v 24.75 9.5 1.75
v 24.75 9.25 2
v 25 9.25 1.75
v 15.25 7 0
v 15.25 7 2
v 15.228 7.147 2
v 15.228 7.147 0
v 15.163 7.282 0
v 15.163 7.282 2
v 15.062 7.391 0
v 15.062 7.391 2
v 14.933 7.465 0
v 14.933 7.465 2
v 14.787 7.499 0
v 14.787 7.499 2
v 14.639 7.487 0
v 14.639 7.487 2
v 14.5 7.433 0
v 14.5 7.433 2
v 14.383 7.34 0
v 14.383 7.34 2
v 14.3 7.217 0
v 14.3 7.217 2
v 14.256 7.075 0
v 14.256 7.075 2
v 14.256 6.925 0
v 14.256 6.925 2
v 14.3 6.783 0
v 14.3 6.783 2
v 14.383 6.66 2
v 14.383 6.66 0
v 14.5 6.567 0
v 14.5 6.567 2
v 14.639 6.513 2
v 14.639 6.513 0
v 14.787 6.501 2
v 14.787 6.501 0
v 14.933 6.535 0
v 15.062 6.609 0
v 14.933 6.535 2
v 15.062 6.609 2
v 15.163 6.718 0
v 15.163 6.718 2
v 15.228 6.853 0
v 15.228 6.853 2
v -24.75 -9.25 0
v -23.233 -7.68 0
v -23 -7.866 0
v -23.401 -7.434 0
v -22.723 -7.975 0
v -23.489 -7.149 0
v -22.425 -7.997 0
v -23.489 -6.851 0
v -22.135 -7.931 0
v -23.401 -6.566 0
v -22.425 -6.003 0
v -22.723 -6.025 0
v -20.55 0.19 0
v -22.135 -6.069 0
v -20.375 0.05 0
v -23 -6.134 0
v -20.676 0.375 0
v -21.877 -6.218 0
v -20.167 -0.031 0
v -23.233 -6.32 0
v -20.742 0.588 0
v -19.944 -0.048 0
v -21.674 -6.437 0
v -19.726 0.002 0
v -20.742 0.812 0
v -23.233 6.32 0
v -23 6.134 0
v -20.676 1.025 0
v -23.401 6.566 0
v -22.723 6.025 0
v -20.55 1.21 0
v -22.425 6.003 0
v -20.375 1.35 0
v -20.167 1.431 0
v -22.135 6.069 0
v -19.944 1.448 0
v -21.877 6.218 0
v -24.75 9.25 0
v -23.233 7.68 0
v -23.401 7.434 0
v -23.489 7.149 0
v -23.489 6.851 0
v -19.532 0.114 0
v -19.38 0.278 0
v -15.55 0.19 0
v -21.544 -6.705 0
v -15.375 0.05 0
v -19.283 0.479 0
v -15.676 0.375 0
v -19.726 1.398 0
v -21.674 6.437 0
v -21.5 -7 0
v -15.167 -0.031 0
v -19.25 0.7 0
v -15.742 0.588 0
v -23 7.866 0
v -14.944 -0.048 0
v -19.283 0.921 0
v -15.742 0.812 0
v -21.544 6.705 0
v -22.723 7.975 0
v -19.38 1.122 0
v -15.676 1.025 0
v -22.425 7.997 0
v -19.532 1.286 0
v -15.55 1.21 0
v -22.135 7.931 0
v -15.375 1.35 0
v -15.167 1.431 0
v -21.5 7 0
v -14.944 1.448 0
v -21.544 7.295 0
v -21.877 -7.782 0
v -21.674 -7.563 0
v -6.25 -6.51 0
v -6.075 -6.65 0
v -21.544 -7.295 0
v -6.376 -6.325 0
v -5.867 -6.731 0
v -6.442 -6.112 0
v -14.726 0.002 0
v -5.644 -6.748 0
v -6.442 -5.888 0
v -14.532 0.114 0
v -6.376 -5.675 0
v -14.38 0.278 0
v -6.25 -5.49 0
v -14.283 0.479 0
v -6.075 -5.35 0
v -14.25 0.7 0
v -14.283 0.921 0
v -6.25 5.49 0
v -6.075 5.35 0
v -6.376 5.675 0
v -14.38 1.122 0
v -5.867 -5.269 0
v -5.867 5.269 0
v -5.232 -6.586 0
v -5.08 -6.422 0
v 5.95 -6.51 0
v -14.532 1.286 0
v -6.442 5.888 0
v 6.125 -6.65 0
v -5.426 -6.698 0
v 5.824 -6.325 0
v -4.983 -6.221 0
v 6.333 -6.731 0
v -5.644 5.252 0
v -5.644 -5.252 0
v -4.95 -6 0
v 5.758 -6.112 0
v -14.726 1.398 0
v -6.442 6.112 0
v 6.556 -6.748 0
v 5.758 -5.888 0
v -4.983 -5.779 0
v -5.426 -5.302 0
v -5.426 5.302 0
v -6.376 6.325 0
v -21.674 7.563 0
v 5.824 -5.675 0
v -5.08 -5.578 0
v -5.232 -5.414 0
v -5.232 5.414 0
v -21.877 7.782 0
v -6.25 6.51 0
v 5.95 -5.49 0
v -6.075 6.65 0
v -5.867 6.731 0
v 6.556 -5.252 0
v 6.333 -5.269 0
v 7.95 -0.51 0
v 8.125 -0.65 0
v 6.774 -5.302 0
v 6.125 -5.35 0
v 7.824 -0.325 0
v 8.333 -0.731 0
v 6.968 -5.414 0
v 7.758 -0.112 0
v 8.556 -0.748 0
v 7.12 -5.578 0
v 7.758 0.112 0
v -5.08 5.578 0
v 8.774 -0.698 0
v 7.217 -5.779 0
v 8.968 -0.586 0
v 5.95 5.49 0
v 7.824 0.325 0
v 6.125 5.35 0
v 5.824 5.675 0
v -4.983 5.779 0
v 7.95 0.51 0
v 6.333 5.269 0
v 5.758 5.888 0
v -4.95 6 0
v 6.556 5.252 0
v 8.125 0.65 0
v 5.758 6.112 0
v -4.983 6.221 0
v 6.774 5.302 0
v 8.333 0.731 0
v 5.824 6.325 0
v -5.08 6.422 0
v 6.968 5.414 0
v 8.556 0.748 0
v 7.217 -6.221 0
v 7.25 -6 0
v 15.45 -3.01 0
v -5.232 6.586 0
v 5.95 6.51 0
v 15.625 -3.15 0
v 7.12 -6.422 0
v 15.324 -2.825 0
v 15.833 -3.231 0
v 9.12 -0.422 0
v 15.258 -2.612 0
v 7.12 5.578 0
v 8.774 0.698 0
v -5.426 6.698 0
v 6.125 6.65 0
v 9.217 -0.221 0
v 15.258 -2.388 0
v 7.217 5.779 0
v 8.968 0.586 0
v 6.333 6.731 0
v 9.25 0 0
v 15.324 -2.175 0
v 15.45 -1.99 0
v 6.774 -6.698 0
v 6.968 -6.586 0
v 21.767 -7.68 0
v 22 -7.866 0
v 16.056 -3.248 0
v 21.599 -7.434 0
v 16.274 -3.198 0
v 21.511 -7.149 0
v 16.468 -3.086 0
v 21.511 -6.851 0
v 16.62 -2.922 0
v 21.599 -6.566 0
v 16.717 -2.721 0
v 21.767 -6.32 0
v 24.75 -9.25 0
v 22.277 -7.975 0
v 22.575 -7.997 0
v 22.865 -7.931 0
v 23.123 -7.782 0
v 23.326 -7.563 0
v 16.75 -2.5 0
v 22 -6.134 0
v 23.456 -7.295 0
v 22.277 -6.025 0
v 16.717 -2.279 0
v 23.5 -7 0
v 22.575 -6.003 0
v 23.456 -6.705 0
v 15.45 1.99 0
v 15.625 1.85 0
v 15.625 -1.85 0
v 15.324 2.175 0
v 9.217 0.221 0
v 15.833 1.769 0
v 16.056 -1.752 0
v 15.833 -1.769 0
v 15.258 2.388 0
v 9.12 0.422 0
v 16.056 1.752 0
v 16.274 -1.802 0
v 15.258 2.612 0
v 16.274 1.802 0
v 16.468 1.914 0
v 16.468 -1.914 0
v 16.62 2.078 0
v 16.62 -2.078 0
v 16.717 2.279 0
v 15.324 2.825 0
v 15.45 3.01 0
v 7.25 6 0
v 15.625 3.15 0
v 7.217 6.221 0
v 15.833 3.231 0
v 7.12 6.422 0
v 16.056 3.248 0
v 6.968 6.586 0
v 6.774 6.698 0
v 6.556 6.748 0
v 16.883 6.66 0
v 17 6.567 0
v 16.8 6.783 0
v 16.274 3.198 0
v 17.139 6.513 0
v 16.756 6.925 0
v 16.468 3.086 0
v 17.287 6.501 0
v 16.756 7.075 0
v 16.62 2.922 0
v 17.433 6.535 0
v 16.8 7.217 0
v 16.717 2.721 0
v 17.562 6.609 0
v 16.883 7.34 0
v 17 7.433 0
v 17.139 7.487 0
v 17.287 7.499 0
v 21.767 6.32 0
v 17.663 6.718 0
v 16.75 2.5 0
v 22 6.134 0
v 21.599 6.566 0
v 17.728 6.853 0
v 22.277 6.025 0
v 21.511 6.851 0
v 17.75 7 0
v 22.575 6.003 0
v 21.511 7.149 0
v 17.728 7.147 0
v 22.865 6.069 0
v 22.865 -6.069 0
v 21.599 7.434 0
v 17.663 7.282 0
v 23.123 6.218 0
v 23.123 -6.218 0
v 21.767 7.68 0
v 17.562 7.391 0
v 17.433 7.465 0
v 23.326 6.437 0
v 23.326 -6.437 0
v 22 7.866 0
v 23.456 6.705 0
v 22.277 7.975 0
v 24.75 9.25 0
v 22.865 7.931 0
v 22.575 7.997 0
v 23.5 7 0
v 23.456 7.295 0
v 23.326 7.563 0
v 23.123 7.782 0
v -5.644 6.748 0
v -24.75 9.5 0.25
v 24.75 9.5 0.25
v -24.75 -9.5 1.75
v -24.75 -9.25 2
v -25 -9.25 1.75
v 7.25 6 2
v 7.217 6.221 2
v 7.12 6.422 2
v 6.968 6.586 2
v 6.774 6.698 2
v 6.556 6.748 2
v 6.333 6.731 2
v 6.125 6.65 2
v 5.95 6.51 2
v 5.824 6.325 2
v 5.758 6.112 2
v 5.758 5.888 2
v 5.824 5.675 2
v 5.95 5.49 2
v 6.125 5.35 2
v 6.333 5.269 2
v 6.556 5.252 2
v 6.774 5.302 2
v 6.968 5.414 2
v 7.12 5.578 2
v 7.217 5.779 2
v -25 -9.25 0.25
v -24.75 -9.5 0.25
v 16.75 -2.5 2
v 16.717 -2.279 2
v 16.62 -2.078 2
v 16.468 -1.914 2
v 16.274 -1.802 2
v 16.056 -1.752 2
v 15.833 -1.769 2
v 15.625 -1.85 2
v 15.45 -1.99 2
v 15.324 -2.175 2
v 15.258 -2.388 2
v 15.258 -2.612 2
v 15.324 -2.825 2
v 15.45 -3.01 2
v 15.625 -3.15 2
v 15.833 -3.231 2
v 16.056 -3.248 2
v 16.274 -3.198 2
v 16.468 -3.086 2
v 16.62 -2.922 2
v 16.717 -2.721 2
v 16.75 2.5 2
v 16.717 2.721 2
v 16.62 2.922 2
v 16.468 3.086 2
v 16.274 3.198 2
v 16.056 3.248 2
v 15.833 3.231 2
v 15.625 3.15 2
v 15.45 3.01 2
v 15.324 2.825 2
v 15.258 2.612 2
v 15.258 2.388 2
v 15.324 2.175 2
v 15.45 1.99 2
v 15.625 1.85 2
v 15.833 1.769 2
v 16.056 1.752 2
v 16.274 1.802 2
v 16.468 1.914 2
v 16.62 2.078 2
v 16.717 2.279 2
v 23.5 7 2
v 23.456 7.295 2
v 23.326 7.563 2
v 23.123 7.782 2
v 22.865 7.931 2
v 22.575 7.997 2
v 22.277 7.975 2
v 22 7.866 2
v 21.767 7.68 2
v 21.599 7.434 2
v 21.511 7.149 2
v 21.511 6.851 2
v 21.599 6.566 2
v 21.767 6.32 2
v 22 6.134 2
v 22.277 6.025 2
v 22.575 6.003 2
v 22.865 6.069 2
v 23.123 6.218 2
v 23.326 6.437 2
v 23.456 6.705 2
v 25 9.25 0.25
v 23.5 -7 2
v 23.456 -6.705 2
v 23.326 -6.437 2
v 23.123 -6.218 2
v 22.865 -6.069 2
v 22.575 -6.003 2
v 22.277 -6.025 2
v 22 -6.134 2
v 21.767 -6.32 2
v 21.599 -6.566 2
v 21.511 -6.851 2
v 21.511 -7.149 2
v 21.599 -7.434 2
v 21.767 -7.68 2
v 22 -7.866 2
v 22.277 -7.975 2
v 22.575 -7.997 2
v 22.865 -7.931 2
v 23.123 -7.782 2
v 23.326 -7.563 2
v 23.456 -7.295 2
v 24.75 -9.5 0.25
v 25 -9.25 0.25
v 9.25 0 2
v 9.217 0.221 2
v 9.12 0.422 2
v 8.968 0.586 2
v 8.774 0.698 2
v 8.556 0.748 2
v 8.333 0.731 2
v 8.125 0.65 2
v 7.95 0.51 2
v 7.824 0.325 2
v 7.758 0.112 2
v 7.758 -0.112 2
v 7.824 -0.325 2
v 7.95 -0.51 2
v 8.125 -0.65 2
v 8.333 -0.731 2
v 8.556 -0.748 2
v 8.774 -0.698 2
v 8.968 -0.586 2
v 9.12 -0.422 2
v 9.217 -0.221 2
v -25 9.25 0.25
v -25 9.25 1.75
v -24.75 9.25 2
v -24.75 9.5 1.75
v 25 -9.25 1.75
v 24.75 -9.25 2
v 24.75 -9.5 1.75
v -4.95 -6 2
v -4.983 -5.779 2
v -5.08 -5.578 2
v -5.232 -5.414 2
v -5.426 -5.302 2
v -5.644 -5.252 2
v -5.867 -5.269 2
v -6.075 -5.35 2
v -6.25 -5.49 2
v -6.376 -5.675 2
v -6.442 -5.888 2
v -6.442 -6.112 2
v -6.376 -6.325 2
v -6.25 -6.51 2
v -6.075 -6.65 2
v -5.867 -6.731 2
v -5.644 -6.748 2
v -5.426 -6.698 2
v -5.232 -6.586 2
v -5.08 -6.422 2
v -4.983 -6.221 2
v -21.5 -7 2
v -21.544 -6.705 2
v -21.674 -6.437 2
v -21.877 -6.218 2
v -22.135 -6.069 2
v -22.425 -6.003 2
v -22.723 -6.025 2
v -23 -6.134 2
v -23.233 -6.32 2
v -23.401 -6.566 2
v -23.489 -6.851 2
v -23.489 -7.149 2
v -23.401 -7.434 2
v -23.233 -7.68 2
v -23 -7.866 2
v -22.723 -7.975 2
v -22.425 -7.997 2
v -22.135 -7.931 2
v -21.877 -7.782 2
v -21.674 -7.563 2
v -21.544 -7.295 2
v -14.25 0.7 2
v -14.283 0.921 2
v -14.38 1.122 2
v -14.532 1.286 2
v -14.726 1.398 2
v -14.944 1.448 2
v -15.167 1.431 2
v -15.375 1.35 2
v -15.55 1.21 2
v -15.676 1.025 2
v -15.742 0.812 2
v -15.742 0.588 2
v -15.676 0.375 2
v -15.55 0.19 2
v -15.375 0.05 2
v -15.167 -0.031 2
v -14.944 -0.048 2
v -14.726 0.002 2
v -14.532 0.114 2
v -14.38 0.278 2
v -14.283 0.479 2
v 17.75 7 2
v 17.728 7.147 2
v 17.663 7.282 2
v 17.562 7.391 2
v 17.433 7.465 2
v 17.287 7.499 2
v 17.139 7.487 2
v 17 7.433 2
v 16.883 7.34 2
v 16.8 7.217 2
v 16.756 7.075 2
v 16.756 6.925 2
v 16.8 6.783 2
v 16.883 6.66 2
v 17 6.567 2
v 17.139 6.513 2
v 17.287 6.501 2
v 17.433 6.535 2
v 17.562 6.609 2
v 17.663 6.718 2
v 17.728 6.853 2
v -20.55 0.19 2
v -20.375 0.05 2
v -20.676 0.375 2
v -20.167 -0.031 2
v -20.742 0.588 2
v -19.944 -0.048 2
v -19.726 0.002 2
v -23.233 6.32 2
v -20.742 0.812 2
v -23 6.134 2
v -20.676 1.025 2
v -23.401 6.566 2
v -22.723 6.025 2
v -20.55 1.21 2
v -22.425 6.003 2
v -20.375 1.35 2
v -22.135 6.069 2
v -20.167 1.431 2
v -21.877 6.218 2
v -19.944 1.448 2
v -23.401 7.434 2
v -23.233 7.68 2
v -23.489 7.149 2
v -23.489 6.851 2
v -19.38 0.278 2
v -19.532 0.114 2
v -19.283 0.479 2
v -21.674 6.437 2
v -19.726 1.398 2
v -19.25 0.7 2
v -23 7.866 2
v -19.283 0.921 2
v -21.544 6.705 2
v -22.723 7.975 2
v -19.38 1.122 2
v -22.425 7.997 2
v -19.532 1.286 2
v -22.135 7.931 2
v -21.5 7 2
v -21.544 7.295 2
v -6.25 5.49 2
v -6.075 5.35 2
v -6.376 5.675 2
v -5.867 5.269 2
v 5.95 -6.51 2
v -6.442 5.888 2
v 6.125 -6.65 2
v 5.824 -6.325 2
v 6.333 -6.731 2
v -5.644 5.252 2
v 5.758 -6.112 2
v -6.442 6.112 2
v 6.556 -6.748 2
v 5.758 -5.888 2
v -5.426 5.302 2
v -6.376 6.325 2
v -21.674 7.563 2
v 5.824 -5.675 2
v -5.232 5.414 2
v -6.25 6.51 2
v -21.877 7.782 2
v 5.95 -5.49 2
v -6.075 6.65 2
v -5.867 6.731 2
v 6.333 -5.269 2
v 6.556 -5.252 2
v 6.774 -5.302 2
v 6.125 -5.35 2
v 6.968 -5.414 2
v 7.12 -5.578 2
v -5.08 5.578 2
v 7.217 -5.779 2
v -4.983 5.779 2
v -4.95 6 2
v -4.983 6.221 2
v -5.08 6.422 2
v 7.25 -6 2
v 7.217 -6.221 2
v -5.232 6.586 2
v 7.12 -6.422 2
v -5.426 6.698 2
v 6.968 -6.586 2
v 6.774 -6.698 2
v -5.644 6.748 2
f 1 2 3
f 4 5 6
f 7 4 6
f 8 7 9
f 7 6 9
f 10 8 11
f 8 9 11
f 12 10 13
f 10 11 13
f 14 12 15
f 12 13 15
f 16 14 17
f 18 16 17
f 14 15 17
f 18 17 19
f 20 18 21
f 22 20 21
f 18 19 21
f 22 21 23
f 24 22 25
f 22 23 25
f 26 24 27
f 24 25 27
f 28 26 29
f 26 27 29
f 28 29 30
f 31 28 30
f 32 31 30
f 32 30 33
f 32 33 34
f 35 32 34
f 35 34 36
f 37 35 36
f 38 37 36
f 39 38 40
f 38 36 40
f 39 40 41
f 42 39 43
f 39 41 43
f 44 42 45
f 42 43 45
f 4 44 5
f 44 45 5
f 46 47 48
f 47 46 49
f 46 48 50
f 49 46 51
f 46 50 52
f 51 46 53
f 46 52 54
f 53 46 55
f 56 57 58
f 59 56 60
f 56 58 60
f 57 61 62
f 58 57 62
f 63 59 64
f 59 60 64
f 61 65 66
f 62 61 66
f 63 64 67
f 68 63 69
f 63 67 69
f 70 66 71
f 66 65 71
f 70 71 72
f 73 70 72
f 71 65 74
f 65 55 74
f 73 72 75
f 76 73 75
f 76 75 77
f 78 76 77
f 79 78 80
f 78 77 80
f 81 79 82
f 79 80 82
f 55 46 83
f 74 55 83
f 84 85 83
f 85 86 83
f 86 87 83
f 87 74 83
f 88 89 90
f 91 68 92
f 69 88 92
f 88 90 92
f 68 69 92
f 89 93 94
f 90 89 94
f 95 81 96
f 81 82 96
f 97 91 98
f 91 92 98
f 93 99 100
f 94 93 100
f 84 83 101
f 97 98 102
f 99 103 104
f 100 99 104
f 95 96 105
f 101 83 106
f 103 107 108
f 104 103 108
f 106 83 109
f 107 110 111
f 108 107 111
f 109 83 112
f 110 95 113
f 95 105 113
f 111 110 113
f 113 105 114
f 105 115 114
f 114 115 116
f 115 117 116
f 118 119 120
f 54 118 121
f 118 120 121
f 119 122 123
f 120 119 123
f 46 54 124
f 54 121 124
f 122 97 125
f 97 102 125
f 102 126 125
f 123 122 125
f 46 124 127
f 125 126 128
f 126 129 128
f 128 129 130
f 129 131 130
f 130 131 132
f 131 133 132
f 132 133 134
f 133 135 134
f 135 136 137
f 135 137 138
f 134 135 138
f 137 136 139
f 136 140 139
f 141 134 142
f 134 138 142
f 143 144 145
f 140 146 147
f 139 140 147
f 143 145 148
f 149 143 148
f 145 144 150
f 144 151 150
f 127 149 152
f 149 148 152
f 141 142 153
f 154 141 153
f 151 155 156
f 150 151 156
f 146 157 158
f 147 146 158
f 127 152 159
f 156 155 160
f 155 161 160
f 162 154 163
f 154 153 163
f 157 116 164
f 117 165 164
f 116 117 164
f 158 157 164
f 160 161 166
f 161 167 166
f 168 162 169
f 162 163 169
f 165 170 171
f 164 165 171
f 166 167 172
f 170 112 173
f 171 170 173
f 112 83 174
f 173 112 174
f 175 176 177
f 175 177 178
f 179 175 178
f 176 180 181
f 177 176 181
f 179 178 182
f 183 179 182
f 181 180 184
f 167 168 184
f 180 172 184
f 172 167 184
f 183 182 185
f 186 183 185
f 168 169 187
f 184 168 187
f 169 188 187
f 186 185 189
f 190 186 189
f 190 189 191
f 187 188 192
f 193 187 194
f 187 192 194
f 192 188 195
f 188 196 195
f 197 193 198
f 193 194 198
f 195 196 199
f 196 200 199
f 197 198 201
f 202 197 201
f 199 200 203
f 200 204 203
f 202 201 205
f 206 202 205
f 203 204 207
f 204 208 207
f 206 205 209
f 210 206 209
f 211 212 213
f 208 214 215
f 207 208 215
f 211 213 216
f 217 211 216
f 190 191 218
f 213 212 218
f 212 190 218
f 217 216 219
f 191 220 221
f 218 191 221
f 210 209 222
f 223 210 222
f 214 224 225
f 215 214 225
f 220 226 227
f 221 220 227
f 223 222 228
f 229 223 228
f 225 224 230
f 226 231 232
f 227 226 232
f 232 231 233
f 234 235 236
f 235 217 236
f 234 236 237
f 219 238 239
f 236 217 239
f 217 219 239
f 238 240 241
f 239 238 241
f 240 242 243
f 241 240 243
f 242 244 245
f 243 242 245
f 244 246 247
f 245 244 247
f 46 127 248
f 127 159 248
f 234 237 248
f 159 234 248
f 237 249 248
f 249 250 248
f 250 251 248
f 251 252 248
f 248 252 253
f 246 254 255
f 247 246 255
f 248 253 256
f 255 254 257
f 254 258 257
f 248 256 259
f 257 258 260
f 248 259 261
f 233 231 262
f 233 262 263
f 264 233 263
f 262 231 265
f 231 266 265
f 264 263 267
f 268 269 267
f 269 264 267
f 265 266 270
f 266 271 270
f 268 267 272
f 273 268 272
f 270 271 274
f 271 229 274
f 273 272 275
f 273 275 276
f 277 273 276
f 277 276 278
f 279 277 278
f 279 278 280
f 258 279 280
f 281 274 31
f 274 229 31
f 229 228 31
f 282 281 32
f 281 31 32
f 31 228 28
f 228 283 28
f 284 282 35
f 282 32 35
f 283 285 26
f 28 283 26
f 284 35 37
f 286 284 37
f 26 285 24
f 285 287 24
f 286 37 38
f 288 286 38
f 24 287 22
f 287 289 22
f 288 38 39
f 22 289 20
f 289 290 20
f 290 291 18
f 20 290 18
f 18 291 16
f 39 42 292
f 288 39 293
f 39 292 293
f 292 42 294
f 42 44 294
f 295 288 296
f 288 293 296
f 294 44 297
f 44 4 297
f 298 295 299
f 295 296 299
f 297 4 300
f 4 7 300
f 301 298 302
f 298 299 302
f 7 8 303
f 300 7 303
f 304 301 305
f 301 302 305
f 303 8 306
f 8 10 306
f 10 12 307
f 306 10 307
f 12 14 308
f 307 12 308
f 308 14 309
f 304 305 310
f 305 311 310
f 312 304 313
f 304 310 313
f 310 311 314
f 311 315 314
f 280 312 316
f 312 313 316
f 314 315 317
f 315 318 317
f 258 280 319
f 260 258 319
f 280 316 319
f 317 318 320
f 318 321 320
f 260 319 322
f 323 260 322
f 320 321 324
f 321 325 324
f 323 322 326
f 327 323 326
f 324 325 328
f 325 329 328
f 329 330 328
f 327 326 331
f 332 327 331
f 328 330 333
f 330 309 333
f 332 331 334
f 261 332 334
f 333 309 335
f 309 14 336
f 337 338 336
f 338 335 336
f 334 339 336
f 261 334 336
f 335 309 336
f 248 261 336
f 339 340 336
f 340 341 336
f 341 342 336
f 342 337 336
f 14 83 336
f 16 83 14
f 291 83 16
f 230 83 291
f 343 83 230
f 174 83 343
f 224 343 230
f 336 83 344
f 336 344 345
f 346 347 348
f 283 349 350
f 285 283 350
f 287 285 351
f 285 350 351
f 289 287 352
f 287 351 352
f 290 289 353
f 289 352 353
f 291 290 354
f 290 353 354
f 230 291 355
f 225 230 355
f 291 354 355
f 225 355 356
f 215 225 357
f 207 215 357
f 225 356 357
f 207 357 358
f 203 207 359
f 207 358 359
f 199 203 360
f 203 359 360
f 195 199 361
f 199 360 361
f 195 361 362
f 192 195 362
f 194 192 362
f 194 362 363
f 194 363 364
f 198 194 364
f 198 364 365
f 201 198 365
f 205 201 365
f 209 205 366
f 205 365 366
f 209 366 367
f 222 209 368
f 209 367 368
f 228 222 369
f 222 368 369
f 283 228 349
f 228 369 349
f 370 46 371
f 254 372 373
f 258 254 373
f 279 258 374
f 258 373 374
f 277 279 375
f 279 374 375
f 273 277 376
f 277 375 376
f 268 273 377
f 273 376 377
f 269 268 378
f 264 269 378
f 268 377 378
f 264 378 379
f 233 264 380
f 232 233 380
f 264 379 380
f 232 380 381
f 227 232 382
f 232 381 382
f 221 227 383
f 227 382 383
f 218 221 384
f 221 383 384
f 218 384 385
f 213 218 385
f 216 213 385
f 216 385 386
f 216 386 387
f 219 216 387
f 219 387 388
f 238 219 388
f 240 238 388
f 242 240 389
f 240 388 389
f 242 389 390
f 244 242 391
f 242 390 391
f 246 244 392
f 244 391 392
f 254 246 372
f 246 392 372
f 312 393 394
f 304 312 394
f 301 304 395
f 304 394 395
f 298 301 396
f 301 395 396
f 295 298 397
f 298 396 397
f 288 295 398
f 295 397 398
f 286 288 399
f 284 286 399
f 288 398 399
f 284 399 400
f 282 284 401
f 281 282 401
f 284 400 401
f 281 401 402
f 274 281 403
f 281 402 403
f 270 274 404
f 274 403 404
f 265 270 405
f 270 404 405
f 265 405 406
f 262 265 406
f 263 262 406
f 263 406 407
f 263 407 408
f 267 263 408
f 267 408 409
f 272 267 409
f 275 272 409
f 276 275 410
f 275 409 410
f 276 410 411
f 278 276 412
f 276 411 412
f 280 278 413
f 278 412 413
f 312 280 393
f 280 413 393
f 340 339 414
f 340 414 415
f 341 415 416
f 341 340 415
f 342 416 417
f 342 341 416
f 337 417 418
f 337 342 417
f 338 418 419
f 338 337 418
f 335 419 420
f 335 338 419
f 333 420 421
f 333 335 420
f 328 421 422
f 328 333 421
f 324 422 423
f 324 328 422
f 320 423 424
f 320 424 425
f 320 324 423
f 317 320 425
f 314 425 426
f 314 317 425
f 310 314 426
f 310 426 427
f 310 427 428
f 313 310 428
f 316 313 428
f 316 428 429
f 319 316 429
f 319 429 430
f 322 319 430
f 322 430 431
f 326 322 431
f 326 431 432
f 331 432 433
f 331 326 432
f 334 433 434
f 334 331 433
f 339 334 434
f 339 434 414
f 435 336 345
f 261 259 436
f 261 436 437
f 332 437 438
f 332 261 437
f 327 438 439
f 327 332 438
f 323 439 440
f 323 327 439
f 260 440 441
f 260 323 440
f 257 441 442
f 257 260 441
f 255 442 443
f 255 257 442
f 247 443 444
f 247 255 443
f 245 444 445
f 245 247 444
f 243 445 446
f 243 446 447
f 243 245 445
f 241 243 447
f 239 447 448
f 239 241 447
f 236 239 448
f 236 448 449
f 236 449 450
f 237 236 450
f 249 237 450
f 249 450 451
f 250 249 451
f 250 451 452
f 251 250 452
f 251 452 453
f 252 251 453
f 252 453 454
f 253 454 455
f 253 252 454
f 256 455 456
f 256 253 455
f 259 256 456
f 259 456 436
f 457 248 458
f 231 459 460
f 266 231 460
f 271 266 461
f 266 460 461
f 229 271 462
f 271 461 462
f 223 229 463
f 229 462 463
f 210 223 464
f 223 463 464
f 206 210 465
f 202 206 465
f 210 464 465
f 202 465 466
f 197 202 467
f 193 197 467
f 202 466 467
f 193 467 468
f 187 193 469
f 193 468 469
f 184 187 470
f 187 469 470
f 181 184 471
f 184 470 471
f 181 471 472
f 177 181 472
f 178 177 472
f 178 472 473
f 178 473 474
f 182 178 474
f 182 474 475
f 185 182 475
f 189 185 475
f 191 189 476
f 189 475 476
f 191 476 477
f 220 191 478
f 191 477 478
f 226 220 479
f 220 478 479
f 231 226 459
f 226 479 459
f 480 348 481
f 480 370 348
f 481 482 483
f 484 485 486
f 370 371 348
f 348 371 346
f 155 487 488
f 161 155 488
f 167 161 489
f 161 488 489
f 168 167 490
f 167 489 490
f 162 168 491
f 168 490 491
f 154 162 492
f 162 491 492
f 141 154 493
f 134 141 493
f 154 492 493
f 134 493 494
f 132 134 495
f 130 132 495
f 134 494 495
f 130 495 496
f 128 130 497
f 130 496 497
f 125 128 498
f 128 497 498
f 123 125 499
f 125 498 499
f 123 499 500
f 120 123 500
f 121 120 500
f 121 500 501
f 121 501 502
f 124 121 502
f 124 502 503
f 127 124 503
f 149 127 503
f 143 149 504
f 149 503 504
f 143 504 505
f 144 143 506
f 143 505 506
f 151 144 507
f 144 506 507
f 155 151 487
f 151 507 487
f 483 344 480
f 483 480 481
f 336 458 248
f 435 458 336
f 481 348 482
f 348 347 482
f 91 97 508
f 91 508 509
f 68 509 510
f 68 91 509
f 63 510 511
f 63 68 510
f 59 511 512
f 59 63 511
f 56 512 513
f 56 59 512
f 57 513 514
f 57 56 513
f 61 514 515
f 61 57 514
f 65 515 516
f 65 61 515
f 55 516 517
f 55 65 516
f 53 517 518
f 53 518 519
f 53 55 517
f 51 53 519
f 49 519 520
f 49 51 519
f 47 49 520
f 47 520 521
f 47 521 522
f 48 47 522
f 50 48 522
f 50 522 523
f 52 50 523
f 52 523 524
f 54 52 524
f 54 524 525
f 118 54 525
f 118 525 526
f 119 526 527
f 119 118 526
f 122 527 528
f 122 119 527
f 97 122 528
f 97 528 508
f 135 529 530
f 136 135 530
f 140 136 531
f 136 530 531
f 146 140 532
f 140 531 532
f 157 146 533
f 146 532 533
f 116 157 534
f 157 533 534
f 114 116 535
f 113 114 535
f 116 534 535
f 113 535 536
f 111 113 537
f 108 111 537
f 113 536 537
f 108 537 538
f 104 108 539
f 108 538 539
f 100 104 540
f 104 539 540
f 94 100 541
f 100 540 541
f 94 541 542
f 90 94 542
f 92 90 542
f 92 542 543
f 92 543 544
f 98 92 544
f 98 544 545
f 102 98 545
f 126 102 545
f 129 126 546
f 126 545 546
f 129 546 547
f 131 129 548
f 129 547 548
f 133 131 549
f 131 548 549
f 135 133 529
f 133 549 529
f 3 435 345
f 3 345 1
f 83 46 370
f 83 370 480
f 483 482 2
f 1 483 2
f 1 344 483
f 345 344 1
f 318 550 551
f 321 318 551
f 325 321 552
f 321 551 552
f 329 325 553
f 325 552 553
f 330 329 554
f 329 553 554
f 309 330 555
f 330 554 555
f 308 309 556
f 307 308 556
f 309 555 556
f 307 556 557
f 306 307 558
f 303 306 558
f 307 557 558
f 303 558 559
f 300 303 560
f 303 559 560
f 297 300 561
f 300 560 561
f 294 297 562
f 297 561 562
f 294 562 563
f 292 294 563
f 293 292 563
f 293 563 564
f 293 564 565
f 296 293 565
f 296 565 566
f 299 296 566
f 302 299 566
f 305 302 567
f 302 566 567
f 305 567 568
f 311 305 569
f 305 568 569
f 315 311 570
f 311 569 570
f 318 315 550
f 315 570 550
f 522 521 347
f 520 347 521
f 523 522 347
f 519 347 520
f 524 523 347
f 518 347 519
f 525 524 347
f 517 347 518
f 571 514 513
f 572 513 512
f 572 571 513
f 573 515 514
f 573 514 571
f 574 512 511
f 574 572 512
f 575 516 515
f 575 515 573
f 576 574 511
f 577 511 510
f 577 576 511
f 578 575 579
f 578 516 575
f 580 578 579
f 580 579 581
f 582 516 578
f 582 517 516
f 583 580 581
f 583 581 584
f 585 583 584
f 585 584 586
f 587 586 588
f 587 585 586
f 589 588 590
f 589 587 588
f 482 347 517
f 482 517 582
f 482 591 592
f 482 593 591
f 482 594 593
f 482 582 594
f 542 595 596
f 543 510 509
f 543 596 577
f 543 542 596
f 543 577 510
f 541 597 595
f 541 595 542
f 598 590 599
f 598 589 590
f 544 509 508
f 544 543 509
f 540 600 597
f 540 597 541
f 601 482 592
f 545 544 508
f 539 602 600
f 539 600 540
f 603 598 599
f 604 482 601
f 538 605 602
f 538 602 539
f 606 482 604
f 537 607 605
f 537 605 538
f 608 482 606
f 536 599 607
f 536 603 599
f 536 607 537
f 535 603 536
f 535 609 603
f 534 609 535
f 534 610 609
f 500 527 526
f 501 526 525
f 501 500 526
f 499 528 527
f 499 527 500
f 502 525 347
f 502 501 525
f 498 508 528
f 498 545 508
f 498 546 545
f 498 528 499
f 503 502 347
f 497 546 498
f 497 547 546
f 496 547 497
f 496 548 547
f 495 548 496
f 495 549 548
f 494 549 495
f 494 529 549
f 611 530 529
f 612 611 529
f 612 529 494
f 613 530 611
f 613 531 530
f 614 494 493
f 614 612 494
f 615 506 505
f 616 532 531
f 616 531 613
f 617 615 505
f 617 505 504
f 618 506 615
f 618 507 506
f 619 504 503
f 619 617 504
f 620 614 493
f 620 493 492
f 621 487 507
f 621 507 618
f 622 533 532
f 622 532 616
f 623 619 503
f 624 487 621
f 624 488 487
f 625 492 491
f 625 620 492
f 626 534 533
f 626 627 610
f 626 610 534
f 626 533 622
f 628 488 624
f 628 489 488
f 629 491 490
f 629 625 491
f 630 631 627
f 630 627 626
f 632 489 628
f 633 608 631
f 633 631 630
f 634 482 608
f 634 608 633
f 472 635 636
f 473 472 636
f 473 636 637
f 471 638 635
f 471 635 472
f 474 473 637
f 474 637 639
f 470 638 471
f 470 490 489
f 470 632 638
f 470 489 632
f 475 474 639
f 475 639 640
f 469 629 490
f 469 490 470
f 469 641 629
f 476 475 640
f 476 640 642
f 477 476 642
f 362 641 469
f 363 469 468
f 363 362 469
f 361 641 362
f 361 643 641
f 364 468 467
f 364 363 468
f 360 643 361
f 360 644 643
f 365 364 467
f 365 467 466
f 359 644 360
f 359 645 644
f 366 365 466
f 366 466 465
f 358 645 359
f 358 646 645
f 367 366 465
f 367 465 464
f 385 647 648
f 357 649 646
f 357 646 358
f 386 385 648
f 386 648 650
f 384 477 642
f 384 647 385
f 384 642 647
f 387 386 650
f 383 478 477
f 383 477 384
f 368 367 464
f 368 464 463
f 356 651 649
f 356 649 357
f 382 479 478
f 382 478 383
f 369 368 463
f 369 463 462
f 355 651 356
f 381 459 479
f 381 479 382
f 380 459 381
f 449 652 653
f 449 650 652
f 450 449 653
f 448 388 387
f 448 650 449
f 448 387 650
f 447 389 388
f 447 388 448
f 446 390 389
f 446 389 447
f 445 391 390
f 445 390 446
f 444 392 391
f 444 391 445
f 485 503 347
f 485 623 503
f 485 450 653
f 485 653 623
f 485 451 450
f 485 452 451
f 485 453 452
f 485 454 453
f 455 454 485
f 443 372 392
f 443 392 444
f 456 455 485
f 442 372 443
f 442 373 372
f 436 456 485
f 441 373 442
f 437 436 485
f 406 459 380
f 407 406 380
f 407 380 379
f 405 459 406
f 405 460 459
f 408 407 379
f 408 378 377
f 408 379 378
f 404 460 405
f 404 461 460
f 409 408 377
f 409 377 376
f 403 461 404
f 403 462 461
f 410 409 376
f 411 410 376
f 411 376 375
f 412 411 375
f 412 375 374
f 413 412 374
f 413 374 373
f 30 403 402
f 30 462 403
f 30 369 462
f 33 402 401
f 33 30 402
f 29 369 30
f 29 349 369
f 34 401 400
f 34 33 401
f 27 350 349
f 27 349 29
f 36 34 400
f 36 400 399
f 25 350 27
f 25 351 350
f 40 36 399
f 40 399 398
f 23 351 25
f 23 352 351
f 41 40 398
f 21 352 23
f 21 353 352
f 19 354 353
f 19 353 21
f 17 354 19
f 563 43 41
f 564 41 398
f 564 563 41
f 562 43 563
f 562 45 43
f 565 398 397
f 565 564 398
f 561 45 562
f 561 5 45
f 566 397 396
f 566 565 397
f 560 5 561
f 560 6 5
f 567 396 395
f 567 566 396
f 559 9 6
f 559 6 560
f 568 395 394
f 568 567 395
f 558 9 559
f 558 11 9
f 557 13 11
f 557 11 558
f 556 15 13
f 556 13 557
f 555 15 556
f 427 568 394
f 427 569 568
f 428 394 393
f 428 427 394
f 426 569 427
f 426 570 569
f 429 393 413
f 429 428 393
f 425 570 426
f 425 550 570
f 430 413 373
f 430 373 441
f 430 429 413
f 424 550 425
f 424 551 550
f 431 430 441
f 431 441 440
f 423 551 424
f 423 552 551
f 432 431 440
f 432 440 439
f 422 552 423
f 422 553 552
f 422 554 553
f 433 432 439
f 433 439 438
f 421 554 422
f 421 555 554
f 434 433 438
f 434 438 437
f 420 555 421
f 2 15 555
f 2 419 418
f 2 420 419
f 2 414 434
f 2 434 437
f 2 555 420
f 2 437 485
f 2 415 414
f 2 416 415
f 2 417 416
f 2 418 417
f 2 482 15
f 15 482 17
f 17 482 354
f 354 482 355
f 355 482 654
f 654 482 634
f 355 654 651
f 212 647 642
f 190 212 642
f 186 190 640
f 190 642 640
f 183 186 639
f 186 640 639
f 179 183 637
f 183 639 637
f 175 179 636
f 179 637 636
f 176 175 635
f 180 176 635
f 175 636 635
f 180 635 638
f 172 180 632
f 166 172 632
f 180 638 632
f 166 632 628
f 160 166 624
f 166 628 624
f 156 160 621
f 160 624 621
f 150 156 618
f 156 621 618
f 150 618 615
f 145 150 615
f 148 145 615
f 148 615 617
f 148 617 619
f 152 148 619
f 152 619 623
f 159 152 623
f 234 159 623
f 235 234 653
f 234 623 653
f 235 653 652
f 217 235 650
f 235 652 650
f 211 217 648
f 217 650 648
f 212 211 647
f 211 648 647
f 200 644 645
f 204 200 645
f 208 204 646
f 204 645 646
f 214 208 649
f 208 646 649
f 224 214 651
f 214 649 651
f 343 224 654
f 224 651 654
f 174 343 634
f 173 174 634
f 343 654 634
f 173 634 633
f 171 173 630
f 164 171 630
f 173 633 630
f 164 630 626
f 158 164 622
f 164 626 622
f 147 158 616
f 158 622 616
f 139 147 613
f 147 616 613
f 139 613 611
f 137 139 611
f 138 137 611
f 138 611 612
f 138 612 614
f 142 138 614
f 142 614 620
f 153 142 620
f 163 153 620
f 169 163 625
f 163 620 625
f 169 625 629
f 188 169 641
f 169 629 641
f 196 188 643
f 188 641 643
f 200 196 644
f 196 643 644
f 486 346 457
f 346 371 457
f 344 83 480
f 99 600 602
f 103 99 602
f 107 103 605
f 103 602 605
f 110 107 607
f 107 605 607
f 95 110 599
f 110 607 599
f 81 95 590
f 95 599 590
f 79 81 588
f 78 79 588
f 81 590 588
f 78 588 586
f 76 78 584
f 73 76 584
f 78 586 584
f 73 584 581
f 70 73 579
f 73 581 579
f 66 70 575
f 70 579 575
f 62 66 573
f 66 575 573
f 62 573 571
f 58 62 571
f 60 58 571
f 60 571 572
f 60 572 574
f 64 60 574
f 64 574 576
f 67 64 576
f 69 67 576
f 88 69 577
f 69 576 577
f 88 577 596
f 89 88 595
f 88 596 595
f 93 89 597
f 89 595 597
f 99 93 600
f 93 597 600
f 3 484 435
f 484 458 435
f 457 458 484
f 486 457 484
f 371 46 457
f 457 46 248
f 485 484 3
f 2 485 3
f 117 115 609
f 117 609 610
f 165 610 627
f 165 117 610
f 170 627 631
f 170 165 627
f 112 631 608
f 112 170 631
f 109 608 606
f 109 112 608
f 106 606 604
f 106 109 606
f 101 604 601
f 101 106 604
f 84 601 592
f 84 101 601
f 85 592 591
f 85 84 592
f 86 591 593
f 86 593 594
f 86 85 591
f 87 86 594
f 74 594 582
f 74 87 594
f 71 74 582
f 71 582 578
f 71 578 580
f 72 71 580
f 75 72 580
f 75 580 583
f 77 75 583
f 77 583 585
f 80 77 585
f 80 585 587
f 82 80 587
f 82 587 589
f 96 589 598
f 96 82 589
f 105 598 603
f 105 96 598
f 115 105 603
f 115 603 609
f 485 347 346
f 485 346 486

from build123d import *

# Parameters (mm, degrees)
SKETCH_1_W          = 50
SKETCH_1_H          = 19
SKETCH_1_R          = 1
EXTRUDE_1_DEPTH     = 2
SKETCH_2_R          = 0.75
SKETCH_2_R_2        = 0.5
CUT_EXTRUDE_1_DEPTH = 2
CHAMFER_1_SIZE      = 0.25


with BuildPart() as part:
    # Эскиз1 → Бобышка-Вытянуть1 (new body)
    with BuildSketch(Plane.XY):
        Rectangle(SKETCH_1_W, SKETCH_1_H)
        with Locations((-22.5, 7)):
            Circle(SKETCH_1_R, mode=Mode.SUBTRACT)
        with Locations((22.5, 7)):
            Circle(SKETCH_1_R, mode=Mode.SUBTRACT)
        with Locations((22.5, -7)):
            Circle(SKETCH_1_R, mode=Mode.SUBTRACT)
        with Locations((-22.5, -7)):
            Circle(SKETCH_1_R, mode=Mode.SUBTRACT)
    extrude(amount=EXTRUDE_1_DEPTH)

    # Эскиз2 → Вырез-Вытянуть1 (cut)
    with BuildSketch(Plane.XY.offset(2)):
        with Locations((-5.7, 6)):
            Circle(SKETCH_2_R)
        with Locations((-5.7, -6)):
            Circle(SKETCH_2_R)
        with Locations((6.5, 6)):
            Circle(SKETCH_2_R)
        with Locations((6.5, -6)):
            Circle(SKETCH_2_R)
        with Locations((8.5, 0)):
            Circle(SKETCH_2_R)
        with Locations((16, 2.5)):
            Circle(SKETCH_2_R)
        with Locations((16, -2.5)):
            Circle(SKETCH_2_R)
        with Locations((14.75, 7)):
            Circle(SKETCH_2_R_2)
        with Locations((-20, 0.7)):
            Circle(SKETCH_2_R)
        with Locations((-15, 0.7)):
            Circle(SKETCH_2_R)
        with Locations((17.25, 7)):
            Circle(SKETCH_2_R_2)
    extrude(amount=-CUT_EXTRUDE_1_DEPTH, mode=Mode.SUBTRACT)

    # Фаска1
    chamfer_1_edges = [part.edges().sort_by_distance(p)[0] for p in [
        (-25, 0, 2),
        (0, -9.5, 2),
        (25, 0, 2),
        (0, -9.5, 0),
        (-25, 0, 0),
        (0, 9.5, 0),
        (25, 0, 0),
        (0, 9.5, 2),
        (25, -9.5, 1),
        (-25, -9.5, 1),
        (-25, 9.5, 1),
        (25, 9.5, 1),
    ]]
    chamfer(chamfer_1_edges, length=CHAMFER_1_SIZE)


solid = part.part
